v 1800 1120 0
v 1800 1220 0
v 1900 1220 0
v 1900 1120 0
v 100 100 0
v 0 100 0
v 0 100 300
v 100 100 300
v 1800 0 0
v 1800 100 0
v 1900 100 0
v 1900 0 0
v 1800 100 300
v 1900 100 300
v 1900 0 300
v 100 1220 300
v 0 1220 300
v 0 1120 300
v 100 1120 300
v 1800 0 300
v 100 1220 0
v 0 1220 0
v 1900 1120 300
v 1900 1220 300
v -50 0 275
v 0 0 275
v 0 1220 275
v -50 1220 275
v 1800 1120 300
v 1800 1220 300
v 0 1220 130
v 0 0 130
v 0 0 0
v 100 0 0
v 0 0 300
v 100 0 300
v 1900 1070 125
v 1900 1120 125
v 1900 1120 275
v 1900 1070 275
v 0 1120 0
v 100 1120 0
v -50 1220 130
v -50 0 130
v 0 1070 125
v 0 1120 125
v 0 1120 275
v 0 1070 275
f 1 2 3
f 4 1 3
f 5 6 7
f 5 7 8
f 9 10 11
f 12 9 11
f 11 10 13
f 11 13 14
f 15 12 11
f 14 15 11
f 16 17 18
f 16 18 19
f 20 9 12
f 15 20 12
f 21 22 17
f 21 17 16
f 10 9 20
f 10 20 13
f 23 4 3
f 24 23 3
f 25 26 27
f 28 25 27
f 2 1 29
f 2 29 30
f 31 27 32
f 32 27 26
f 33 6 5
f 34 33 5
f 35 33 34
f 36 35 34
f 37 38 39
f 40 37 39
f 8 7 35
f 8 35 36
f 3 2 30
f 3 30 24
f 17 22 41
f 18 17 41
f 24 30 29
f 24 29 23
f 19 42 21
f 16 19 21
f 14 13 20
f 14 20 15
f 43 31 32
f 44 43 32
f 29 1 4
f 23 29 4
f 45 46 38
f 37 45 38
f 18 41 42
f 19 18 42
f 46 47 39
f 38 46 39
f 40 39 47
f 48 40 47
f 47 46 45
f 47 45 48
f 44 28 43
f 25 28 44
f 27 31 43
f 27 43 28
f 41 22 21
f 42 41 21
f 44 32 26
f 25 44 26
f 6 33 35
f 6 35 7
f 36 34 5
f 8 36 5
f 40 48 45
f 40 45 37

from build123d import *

# Parameters (mm, degrees)
F0_W     = 100
F0_H     = 50
F0_H_2   = 100
F1_DEPTH = 300
F2_W     = 100
F2_H     = 150
F2_W_2   = 1800
F3_DEPTH = 50
F4_W     = 100
F4_H     = 145
F4_W_2   = 1120
F5_DEPTH = 50


with BuildPart() as f1:
    # F0 (on Top) → F1 (new body)
    with BuildSketch(Plane.XY):
        with Locations((50, 1195)):
            Rectangle(F0_W, F0_H)
        with Locations((50, 1145)):
            Rectangle(F0_W, F0_H)
        with Locations((50, 50)):
            Rectangle(F0_W, F0_H_2)
        with Locations((1850, 1170)):
            Rectangle(F0_W, F0_H_2)
        with Locations((1850, 50)):
            Rectangle(F0_W, F0_H_2)
    extrude(amount=F1_DEPTH)


with BuildPart() as f3:
    # F2 (on face) → F3 (new body)
    with BuildSketch(Plane.XZ.offset(-1120)):
        with Locations((50, 200)):
            Rectangle(F2_W, F2_H)
        with Locations((1000, 200)):
            Rectangle(F2_W_2, F2_H)
    extrude(amount=F3_DEPTH)


with BuildPart() as f5:
    # F4 (on face) → F5 (new body)
    with BuildSketch(Plane(origin=(0, 0, 0), x_dir=(0, -1, 0), z_dir=(-1, 0, 0))):
        with Locations((-1170, 202.5)):
            Rectangle(F4_W, F4_H)
        with Locations((-560, 202.5)):
            Rectangle(F4_W_2, F4_H)
    extrude(amount=F5_DEPTH)


solid = Compound([f1.part, f3.part, f5.part])
